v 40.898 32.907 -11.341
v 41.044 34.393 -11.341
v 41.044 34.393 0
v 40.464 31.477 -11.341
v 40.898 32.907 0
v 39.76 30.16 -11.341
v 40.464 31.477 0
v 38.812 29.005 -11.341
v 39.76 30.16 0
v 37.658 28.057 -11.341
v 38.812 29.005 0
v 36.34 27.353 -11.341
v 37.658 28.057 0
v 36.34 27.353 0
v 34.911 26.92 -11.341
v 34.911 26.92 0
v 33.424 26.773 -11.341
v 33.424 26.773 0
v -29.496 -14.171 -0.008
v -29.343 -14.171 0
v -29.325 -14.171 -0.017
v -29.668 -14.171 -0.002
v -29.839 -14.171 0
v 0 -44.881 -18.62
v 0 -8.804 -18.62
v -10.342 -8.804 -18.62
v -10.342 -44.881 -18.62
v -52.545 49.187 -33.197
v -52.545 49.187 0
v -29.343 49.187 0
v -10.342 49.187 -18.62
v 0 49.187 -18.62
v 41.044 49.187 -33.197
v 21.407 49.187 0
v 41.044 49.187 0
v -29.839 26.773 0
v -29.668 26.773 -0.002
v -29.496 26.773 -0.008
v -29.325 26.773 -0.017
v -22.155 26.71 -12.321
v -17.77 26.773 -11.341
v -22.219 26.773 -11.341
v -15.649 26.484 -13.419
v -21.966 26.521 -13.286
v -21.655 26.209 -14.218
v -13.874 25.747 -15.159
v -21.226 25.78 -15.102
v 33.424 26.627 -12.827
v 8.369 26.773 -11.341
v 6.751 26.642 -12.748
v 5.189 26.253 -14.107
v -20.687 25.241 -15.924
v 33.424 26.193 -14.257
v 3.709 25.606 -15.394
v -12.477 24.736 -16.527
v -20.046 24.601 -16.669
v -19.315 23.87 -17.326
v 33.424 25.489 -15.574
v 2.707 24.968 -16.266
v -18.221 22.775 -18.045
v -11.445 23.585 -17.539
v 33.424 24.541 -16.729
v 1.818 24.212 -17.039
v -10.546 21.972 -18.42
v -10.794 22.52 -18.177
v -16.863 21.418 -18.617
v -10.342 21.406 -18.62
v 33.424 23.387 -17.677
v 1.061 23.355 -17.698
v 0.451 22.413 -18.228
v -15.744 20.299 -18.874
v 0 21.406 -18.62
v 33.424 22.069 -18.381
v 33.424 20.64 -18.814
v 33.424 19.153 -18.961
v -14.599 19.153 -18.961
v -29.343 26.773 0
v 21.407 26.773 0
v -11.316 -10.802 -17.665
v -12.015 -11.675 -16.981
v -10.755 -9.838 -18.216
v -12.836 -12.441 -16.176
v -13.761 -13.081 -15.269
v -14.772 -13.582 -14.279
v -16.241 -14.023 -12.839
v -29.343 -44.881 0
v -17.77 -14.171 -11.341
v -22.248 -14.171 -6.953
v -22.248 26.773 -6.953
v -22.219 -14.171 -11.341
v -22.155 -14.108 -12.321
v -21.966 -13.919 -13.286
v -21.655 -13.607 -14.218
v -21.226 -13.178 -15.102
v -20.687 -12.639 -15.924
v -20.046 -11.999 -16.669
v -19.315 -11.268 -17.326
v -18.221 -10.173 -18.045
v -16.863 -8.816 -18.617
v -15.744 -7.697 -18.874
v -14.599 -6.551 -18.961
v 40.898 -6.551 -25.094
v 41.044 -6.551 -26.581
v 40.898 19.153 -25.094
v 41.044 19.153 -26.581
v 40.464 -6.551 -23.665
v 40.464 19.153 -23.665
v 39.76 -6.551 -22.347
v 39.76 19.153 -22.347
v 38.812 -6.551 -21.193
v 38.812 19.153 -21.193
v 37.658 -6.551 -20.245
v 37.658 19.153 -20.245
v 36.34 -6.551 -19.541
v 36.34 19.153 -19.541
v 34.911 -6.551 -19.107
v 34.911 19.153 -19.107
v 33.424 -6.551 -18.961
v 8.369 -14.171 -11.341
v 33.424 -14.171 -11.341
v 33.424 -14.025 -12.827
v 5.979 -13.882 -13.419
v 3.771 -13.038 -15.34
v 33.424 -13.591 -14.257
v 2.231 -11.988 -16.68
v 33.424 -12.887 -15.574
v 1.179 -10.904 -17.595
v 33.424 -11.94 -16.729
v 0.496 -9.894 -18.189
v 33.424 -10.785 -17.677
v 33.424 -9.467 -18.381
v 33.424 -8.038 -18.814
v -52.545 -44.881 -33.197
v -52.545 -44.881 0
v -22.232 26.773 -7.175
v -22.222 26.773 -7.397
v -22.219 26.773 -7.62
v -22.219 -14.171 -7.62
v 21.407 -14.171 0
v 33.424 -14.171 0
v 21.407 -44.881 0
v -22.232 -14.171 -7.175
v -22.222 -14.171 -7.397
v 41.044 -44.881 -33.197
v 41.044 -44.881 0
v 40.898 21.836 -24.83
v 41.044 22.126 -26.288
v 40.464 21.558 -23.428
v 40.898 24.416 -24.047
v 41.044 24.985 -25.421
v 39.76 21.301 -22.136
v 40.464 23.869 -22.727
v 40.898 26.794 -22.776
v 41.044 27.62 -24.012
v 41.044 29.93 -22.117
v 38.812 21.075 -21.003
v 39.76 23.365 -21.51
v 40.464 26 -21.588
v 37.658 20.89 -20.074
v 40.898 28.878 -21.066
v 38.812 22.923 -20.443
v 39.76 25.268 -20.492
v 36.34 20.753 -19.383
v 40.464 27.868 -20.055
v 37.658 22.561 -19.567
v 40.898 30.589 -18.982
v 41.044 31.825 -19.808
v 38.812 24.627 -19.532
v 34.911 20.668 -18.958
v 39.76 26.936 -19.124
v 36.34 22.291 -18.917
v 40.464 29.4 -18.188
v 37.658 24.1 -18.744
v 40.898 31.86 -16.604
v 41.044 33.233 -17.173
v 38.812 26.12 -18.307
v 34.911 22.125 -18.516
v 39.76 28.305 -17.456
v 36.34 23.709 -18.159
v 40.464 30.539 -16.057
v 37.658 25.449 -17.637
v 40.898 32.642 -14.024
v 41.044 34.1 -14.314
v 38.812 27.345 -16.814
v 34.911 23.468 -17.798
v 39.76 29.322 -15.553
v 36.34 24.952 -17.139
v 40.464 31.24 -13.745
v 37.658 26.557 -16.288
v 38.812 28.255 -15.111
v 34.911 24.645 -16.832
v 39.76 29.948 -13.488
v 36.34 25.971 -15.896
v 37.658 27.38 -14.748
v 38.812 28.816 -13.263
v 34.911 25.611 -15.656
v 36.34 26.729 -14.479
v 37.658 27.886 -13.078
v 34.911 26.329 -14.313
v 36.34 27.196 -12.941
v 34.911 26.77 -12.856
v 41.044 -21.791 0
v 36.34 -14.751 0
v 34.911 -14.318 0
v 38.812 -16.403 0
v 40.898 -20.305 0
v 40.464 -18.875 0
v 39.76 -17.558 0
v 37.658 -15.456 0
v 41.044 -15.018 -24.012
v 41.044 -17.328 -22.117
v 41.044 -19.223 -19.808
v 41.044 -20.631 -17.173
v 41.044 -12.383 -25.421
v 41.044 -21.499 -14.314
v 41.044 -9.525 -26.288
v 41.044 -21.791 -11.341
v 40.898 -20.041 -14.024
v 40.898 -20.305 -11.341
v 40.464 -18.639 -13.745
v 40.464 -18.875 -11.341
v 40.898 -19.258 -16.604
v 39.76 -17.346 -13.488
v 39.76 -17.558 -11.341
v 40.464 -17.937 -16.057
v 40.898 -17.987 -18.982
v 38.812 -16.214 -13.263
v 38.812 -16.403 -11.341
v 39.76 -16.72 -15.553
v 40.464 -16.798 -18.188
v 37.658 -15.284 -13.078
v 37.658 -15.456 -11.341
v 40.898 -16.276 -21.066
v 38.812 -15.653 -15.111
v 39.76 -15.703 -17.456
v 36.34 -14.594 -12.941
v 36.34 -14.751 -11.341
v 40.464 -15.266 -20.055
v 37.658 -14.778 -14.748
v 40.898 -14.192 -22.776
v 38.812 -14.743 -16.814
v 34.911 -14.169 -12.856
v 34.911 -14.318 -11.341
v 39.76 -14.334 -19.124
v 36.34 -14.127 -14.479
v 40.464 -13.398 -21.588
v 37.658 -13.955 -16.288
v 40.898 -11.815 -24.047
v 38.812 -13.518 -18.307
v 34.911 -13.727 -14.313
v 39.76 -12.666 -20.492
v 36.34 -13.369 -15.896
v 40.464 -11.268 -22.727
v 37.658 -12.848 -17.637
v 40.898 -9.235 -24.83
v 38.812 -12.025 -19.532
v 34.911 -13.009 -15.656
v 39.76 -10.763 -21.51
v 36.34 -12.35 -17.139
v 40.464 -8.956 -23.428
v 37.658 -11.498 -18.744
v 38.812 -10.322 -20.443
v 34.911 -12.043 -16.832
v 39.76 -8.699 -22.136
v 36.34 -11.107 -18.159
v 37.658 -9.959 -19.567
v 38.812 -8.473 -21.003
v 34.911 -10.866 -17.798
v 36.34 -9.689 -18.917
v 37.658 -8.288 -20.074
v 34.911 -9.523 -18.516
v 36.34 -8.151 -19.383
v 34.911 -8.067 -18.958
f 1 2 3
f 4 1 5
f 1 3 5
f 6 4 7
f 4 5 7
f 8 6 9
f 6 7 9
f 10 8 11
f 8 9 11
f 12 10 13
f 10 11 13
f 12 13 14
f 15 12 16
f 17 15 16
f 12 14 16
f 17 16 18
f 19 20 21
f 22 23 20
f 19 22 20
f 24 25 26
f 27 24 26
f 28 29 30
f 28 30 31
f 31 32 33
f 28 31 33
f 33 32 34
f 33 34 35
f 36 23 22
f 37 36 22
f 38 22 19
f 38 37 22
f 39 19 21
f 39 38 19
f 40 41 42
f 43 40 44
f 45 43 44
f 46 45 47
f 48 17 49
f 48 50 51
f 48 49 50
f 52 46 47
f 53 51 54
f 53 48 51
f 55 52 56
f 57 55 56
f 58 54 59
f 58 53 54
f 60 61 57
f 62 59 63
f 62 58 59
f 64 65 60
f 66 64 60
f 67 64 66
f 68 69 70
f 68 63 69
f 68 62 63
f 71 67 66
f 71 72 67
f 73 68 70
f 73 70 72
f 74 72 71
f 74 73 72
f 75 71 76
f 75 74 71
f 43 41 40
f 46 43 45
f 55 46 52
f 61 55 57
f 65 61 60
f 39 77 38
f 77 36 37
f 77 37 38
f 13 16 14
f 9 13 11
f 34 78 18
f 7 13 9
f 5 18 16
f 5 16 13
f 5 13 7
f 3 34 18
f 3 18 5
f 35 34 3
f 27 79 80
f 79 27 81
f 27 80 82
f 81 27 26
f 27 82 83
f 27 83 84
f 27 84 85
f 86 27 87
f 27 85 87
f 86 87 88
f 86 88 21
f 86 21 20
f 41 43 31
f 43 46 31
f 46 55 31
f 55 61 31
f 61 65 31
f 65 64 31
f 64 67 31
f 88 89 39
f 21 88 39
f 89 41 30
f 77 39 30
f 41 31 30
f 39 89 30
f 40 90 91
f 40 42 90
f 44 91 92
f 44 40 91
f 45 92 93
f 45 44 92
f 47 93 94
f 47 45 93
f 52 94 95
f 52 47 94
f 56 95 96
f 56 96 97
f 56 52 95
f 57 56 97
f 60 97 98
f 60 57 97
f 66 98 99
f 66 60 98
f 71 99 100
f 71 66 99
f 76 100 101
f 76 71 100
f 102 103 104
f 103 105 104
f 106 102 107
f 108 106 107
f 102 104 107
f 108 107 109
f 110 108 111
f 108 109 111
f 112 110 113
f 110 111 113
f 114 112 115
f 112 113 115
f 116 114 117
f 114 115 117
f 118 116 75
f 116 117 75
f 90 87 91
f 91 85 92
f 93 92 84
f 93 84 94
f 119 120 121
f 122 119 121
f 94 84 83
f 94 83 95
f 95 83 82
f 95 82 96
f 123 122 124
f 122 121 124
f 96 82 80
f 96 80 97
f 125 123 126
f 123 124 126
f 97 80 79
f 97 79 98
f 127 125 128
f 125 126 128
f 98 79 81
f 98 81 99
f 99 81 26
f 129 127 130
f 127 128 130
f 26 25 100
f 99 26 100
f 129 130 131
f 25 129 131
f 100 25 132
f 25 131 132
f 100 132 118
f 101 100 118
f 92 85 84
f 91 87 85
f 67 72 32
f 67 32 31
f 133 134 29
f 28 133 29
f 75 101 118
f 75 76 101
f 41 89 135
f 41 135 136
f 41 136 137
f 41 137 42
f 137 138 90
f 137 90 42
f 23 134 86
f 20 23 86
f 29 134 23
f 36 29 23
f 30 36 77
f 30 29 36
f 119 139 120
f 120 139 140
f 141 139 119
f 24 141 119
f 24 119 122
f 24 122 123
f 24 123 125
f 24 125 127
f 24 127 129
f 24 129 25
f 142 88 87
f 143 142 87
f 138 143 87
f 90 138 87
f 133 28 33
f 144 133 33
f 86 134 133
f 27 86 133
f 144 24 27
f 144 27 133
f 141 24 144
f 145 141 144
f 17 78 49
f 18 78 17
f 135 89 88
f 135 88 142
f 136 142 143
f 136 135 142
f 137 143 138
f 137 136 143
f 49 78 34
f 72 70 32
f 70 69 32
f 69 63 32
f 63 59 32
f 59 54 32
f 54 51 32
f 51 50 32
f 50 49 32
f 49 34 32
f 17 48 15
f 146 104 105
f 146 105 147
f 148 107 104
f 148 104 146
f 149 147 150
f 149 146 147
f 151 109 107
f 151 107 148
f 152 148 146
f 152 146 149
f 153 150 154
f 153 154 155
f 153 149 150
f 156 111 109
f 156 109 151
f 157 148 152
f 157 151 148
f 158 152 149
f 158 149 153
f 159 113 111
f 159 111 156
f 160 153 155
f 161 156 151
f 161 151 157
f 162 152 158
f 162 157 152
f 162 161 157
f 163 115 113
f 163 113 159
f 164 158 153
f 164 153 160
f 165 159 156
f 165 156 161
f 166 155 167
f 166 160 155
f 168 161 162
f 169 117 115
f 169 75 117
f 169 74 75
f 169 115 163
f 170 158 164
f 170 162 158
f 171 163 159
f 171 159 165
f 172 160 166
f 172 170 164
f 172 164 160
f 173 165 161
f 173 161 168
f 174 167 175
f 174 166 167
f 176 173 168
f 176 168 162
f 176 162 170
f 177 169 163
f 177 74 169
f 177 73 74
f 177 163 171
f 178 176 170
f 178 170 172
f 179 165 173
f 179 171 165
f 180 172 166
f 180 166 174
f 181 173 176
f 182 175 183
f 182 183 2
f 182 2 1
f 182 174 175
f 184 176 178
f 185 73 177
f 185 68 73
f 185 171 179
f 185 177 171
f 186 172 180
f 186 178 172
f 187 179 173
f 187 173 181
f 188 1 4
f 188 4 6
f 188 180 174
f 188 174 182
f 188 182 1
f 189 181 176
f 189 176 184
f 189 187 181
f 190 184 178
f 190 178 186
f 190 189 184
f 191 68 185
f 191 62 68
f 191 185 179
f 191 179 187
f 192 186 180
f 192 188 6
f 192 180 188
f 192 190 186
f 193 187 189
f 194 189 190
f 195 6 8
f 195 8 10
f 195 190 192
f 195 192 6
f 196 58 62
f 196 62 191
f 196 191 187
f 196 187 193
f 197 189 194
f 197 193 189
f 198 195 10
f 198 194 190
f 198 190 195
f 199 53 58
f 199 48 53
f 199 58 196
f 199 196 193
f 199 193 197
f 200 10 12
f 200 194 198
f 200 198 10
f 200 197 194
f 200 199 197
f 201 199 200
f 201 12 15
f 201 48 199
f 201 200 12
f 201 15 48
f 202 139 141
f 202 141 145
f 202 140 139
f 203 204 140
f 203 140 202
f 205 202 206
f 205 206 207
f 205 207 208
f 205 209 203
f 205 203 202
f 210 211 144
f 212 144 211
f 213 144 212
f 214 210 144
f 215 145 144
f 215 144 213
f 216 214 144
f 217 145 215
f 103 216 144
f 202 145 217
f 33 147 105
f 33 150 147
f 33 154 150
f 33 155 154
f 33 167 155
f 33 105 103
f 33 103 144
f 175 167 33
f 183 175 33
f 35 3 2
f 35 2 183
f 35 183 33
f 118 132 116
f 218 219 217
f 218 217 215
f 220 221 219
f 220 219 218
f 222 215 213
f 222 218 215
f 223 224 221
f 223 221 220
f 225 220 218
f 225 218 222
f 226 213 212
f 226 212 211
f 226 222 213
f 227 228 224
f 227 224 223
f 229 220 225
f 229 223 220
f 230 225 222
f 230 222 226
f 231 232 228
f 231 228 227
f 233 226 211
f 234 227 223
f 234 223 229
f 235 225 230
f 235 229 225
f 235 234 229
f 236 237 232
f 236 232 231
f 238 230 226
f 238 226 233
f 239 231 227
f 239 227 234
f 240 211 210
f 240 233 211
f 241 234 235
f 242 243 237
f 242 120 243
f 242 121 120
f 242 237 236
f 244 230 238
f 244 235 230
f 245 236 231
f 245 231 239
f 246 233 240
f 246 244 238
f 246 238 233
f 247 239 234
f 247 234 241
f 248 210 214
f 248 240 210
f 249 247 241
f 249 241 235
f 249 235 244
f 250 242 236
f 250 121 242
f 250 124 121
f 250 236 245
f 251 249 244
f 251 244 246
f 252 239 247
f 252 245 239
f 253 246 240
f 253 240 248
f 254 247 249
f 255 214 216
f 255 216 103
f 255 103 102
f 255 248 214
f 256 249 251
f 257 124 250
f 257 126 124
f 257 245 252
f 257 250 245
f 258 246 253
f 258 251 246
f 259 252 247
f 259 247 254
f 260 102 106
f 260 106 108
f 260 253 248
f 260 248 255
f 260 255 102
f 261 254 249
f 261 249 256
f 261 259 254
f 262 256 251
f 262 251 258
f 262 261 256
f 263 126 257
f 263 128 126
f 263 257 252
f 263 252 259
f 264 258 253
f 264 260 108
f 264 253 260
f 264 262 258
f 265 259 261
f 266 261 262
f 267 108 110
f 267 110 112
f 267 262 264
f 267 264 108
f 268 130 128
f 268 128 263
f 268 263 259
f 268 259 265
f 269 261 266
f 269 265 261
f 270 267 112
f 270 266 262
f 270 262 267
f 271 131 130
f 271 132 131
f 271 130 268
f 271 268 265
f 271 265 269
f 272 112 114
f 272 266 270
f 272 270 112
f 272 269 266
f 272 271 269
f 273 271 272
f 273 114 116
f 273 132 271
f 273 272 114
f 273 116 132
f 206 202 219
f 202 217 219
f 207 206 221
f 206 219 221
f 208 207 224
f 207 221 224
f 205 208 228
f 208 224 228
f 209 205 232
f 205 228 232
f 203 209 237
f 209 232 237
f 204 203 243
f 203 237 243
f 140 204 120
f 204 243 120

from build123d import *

# Parameters (mm, degrees)
F0_W     = 93.5896597803
F0_H     = 94.0682813525
F1_DEPTH = 33.197
F2_W     = 63.2629562169
F2_H     = 40.9446330741
F3_DEPTH = 18.96077
F4_F1_R  = 7.62
F4_F2_R  = 7.62
F6_DEPTH = 123.1075


with BuildPart() as f1:
    # F0 (on Top) → F1 (new body)
    with BuildSketch(Plane.XY):
        with Locations((-5.7506207377, 2.1532103419)):
            Rectangle(F0_W, F0_H)
    extrude(amount=-F1_DEPTH)

    # F2 (on face) → F3 (cut)
    with BuildSketch(Plane.XY):
        with Locations((9.412731044, 6.3009518199)):
            Rectangle(F2_W, F2_H)
    extrude(amount=-F3_DEPTH, mode=Mode.SUBTRACT)

    # F4: fillet of radius 7.62 on 5 edges, made by hand

    # F4_f1
    f4_f1_edges = [f1.edges().sort_by_distance(p)[0] for p in [
        (9.412731044, -14.1713647172, -18.96077),
        (9.412731044, 26.7732683569, -18.96077),
        (-22.2187470645, 6.3009518199, -18.96077),
    ]]
    fillet(f4_f1_edges, radius=F4_F1_R)

    # F4_f2
    f4_f2_edges = [f1.edges().sort_by_distance(p)[0] for p in [
        (41.0442091525, 6.3009518199, -18.96077),
        (-22.2187470645, 6.3009518199, 0),
        (41.0442091525, -11.9395183898, -16.7289236726),
        (41.0442091525, 24.5414220296, -16.7289236726),
    ]]
    fillet(f4_f2_edges, radius=F4_F2_R)

    # F5 (on face) → F6 (cut)
    with BuildSketch(Plane(origin=(0, 49.1873510182, 0), x_dir=(-1, 0, 0), z_dir=(0, 1, 0))):
        Polygon((29.3431449682, 0), (-21.4069634676, 0), (0, -18.6201948673), (10.3417439386, -18.6201948673), align=None)
    extrude(amount=-F6_DEPTH, mode=Mode.SUBTRACT)


solid = f1.part
